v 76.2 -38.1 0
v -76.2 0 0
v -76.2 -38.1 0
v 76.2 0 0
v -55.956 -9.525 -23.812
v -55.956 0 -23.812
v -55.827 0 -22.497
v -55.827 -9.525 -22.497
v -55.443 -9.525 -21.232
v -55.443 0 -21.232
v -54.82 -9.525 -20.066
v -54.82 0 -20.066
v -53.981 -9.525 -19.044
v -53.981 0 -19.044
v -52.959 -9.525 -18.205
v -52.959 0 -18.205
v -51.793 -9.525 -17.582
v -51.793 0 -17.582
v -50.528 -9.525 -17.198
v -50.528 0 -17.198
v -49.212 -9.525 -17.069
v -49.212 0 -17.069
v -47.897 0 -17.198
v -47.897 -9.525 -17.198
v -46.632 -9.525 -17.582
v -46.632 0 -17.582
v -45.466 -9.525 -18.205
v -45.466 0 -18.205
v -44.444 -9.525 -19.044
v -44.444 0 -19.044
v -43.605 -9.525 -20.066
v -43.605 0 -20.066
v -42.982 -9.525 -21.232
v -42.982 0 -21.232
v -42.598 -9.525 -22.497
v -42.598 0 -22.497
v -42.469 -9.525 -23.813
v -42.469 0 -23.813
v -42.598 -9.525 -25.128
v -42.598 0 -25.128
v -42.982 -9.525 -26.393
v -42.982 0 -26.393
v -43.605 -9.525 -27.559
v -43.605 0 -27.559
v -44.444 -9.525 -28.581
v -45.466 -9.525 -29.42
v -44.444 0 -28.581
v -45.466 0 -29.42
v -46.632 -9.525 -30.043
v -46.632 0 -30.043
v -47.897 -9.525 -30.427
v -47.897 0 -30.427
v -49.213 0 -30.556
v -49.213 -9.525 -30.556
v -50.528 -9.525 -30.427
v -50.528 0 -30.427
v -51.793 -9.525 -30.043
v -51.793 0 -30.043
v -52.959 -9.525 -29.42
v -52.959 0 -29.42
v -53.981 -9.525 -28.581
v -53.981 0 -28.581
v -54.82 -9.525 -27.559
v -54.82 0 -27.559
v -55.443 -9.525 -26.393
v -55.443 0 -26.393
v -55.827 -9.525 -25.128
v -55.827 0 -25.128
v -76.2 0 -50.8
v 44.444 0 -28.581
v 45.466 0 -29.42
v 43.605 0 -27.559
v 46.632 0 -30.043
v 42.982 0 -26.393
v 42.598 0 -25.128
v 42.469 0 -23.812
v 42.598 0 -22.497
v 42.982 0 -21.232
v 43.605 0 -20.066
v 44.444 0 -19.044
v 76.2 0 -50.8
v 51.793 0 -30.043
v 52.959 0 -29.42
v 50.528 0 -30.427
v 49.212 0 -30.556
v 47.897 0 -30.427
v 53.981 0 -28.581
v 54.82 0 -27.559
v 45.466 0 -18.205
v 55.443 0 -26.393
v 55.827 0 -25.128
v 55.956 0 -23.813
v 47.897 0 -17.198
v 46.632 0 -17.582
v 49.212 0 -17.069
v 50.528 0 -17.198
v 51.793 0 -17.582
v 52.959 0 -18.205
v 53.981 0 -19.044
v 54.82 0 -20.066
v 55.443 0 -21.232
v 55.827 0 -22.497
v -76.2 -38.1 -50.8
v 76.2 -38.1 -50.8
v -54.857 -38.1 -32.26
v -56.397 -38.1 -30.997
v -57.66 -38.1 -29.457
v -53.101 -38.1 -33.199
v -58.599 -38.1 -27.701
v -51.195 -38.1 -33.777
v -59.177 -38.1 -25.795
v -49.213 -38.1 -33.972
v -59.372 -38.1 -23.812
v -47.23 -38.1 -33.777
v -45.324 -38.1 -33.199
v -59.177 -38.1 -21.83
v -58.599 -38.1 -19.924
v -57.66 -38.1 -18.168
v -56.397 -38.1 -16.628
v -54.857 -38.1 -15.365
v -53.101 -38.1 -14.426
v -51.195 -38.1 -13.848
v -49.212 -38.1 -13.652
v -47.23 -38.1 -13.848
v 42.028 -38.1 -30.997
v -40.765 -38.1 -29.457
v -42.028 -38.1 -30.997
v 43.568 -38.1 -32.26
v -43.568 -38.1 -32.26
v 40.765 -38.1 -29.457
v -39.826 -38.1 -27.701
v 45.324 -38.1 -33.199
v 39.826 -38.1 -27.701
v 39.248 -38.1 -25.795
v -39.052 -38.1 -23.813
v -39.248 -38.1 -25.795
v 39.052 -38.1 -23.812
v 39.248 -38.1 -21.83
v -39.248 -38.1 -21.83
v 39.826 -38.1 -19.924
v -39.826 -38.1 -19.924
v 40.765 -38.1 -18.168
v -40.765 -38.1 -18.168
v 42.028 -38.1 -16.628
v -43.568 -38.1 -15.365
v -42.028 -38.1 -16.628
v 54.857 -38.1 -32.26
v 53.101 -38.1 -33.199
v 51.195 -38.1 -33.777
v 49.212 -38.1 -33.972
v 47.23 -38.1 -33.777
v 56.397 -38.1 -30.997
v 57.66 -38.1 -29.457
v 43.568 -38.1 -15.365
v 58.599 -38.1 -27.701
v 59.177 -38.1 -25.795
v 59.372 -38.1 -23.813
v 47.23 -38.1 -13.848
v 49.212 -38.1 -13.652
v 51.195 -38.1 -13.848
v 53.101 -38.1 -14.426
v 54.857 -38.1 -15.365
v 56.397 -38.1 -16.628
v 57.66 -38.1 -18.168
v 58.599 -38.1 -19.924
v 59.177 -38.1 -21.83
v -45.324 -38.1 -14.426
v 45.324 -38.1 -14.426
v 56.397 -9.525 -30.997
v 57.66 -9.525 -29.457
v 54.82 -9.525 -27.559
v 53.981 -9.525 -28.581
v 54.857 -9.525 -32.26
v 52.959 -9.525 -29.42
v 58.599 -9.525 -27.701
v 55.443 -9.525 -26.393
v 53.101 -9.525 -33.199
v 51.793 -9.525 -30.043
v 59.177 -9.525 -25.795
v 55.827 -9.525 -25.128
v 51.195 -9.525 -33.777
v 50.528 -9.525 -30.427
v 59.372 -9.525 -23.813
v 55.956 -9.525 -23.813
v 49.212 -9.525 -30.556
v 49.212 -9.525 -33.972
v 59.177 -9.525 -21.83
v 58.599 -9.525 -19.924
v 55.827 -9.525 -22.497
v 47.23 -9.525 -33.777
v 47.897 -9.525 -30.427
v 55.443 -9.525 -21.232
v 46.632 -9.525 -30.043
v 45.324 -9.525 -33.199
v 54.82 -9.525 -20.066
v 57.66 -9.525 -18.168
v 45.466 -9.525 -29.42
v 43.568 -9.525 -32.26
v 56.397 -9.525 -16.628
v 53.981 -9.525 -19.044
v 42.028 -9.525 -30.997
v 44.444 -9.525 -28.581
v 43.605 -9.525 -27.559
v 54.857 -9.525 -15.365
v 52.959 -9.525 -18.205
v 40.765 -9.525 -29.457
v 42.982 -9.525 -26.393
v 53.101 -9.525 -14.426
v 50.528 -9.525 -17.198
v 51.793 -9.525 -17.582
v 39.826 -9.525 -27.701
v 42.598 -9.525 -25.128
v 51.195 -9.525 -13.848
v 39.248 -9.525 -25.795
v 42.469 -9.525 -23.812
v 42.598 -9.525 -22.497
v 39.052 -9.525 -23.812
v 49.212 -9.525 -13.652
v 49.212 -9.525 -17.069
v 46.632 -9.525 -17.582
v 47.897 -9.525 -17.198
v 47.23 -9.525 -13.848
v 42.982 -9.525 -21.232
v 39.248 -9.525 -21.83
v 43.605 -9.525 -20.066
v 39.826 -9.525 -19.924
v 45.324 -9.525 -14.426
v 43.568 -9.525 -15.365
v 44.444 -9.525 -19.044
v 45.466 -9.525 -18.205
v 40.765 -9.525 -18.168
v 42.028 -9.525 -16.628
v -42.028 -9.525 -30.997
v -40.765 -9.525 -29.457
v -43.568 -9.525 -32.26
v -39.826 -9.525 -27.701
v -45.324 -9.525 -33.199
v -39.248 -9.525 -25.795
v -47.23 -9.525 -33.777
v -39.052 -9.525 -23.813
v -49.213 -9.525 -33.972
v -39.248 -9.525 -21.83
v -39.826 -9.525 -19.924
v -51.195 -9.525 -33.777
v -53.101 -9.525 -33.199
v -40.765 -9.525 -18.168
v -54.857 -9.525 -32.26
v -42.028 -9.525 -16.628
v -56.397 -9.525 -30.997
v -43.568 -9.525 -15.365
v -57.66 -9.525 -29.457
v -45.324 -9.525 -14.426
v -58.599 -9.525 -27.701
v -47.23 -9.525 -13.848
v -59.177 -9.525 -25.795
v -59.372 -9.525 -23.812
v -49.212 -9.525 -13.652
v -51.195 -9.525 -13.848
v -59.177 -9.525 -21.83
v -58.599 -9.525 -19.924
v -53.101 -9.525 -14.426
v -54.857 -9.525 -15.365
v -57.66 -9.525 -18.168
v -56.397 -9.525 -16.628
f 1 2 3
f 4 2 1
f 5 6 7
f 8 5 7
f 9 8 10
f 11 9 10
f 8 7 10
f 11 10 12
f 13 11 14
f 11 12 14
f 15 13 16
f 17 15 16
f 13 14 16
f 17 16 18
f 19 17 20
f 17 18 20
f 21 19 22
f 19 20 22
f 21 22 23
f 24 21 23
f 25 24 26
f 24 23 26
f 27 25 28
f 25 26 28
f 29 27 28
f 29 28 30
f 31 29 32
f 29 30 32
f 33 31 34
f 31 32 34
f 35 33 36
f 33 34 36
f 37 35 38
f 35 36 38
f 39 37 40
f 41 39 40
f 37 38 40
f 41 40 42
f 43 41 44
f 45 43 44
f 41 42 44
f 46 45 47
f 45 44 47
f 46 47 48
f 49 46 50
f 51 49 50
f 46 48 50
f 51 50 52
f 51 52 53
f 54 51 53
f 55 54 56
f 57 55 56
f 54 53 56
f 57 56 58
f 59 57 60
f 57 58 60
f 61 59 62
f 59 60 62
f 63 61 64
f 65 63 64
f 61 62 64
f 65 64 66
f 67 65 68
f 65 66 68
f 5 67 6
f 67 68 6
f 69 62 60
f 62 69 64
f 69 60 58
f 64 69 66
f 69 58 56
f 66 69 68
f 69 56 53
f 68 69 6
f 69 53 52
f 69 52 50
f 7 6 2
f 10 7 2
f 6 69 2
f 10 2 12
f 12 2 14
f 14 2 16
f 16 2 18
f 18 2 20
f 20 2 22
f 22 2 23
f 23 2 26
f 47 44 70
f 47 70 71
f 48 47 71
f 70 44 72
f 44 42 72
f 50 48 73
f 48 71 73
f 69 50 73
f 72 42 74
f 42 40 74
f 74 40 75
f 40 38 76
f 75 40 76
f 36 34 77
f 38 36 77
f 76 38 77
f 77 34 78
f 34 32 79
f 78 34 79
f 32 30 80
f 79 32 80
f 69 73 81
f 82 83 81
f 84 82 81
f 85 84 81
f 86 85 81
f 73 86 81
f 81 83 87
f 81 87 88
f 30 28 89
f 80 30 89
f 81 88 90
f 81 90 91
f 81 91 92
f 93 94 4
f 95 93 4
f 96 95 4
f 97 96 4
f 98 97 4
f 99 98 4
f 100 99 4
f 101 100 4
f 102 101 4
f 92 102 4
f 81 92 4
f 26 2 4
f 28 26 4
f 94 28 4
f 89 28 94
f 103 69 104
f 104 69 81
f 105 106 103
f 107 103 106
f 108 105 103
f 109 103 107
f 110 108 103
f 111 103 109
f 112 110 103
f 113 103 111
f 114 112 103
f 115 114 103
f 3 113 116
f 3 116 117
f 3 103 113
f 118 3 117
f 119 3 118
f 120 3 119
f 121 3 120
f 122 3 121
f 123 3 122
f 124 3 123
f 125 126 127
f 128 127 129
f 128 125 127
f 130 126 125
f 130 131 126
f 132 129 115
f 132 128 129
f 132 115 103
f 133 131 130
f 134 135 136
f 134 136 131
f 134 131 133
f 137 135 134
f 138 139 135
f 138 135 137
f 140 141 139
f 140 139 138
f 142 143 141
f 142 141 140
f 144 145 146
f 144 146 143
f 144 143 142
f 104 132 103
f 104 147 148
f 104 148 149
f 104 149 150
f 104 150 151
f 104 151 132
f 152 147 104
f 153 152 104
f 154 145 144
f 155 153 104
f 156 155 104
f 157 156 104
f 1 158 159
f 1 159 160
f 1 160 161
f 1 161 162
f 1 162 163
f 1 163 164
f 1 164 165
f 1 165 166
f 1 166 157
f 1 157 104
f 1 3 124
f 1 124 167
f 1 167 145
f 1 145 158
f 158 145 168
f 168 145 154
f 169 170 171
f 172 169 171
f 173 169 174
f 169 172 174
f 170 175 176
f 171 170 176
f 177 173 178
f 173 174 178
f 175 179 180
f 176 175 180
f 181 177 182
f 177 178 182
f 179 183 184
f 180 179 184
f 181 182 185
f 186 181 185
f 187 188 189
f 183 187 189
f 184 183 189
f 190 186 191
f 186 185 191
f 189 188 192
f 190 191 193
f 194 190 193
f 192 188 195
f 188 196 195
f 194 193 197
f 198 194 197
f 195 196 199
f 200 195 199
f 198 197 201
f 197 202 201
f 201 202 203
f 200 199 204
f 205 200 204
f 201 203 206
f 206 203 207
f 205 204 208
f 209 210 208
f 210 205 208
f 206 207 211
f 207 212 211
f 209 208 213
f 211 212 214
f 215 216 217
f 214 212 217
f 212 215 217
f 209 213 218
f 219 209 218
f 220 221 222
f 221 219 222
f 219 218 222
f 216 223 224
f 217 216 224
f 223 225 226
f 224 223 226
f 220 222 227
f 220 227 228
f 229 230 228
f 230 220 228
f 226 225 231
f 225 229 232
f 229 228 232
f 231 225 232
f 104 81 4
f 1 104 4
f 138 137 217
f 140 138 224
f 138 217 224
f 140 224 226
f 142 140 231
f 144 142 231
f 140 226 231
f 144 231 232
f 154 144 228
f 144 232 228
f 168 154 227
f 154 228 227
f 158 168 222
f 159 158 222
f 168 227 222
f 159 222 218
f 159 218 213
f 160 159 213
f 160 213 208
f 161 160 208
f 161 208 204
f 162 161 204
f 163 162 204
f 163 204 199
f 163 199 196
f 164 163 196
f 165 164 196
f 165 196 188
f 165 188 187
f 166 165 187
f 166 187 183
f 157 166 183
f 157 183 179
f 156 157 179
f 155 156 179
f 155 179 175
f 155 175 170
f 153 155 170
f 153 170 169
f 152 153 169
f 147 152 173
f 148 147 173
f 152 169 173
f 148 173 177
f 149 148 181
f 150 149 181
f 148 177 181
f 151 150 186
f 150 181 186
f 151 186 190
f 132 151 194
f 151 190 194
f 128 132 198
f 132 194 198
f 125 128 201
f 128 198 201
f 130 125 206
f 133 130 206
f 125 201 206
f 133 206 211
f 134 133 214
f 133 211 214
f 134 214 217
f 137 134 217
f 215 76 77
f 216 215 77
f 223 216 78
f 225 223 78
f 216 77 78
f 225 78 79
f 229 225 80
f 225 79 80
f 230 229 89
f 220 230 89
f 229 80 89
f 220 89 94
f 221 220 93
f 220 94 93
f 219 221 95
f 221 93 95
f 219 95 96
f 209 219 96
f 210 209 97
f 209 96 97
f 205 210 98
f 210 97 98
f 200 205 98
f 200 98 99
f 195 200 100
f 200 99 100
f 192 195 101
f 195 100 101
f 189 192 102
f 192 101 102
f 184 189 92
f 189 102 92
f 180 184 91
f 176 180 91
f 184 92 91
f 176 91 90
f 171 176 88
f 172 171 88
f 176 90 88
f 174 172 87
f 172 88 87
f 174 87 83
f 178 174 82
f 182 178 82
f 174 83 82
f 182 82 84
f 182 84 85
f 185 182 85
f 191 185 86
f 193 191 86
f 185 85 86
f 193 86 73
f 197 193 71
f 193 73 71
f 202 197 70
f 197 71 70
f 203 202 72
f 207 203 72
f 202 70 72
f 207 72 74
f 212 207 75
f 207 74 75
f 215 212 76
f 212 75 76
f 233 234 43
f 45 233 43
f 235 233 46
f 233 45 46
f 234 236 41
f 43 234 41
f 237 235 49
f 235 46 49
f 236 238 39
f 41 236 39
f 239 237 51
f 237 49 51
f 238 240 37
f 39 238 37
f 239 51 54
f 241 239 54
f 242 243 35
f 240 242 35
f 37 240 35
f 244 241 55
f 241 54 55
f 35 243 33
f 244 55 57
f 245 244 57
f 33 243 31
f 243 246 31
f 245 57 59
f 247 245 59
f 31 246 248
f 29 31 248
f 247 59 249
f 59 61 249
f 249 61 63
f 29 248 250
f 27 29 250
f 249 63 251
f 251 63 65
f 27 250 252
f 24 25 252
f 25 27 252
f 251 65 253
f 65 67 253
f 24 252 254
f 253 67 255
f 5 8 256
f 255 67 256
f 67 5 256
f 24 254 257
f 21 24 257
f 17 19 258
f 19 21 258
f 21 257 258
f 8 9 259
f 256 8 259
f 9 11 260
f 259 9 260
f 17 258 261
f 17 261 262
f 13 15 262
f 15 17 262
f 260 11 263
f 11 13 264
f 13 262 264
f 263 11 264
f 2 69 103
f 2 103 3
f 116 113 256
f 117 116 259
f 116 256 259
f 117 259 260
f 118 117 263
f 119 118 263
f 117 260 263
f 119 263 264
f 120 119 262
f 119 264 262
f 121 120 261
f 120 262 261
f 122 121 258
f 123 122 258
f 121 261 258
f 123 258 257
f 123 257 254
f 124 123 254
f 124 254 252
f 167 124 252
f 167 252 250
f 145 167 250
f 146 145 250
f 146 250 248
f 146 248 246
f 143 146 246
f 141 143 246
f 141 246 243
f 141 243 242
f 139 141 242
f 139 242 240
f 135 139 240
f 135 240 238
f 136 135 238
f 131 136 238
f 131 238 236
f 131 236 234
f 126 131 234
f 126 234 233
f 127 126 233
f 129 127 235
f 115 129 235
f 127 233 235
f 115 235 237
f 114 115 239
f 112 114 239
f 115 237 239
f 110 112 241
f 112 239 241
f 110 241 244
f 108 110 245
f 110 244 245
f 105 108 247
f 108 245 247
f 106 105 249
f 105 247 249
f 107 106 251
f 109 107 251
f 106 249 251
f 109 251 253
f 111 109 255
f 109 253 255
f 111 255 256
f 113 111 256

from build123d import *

# Parameters (mm, degrees)
F0_W     = 152.4
F0_H     = 50.8
F1_DEPTH = 38.1
F2_R     = 6.7437
F3_DEPTH = 9.525
F4_R     = 10.16
F5_DEPTH = 152.4


with BuildPart() as f1:
    # F0 (on Front) → F1 (new body)
    with BuildSketch(Plane.XZ):
        with Locations((0, -25.4)):
            Rectangle(F0_W, F0_H)
    extrude(amount=F1_DEPTH)

    # F2 (on face) → F3 (cut)
    with BuildSketch(Plane(origin=(0, 0, 0), x_dir=(-1, 0, 0), z_dir=(0, 1, 0))):
        with Locations((49.2125, -23.8125)):
            Circle(F2_R)
        with Locations((-49.2125, -23.8125)):
            Circle(F2_R)
    extrude(amount=-F3_DEPTH, mode=Mode.SUBTRACT)

    # F4 (on face) → F5 (cut)
    with BuildSketch(Plane(origin=(0, -9.525, 0), x_dir=(-1, 0, 0), z_dir=(0, 1, 0))):
        with Locations((-49.2125, -23.8125)):
            Circle(F4_R)
        with Locations((49.2125, -23.8125)):
            Circle(F4_R)
    extrude(amount=-F5_DEPTH, mode=Mode.SUBTRACT)


solid = f1.part
